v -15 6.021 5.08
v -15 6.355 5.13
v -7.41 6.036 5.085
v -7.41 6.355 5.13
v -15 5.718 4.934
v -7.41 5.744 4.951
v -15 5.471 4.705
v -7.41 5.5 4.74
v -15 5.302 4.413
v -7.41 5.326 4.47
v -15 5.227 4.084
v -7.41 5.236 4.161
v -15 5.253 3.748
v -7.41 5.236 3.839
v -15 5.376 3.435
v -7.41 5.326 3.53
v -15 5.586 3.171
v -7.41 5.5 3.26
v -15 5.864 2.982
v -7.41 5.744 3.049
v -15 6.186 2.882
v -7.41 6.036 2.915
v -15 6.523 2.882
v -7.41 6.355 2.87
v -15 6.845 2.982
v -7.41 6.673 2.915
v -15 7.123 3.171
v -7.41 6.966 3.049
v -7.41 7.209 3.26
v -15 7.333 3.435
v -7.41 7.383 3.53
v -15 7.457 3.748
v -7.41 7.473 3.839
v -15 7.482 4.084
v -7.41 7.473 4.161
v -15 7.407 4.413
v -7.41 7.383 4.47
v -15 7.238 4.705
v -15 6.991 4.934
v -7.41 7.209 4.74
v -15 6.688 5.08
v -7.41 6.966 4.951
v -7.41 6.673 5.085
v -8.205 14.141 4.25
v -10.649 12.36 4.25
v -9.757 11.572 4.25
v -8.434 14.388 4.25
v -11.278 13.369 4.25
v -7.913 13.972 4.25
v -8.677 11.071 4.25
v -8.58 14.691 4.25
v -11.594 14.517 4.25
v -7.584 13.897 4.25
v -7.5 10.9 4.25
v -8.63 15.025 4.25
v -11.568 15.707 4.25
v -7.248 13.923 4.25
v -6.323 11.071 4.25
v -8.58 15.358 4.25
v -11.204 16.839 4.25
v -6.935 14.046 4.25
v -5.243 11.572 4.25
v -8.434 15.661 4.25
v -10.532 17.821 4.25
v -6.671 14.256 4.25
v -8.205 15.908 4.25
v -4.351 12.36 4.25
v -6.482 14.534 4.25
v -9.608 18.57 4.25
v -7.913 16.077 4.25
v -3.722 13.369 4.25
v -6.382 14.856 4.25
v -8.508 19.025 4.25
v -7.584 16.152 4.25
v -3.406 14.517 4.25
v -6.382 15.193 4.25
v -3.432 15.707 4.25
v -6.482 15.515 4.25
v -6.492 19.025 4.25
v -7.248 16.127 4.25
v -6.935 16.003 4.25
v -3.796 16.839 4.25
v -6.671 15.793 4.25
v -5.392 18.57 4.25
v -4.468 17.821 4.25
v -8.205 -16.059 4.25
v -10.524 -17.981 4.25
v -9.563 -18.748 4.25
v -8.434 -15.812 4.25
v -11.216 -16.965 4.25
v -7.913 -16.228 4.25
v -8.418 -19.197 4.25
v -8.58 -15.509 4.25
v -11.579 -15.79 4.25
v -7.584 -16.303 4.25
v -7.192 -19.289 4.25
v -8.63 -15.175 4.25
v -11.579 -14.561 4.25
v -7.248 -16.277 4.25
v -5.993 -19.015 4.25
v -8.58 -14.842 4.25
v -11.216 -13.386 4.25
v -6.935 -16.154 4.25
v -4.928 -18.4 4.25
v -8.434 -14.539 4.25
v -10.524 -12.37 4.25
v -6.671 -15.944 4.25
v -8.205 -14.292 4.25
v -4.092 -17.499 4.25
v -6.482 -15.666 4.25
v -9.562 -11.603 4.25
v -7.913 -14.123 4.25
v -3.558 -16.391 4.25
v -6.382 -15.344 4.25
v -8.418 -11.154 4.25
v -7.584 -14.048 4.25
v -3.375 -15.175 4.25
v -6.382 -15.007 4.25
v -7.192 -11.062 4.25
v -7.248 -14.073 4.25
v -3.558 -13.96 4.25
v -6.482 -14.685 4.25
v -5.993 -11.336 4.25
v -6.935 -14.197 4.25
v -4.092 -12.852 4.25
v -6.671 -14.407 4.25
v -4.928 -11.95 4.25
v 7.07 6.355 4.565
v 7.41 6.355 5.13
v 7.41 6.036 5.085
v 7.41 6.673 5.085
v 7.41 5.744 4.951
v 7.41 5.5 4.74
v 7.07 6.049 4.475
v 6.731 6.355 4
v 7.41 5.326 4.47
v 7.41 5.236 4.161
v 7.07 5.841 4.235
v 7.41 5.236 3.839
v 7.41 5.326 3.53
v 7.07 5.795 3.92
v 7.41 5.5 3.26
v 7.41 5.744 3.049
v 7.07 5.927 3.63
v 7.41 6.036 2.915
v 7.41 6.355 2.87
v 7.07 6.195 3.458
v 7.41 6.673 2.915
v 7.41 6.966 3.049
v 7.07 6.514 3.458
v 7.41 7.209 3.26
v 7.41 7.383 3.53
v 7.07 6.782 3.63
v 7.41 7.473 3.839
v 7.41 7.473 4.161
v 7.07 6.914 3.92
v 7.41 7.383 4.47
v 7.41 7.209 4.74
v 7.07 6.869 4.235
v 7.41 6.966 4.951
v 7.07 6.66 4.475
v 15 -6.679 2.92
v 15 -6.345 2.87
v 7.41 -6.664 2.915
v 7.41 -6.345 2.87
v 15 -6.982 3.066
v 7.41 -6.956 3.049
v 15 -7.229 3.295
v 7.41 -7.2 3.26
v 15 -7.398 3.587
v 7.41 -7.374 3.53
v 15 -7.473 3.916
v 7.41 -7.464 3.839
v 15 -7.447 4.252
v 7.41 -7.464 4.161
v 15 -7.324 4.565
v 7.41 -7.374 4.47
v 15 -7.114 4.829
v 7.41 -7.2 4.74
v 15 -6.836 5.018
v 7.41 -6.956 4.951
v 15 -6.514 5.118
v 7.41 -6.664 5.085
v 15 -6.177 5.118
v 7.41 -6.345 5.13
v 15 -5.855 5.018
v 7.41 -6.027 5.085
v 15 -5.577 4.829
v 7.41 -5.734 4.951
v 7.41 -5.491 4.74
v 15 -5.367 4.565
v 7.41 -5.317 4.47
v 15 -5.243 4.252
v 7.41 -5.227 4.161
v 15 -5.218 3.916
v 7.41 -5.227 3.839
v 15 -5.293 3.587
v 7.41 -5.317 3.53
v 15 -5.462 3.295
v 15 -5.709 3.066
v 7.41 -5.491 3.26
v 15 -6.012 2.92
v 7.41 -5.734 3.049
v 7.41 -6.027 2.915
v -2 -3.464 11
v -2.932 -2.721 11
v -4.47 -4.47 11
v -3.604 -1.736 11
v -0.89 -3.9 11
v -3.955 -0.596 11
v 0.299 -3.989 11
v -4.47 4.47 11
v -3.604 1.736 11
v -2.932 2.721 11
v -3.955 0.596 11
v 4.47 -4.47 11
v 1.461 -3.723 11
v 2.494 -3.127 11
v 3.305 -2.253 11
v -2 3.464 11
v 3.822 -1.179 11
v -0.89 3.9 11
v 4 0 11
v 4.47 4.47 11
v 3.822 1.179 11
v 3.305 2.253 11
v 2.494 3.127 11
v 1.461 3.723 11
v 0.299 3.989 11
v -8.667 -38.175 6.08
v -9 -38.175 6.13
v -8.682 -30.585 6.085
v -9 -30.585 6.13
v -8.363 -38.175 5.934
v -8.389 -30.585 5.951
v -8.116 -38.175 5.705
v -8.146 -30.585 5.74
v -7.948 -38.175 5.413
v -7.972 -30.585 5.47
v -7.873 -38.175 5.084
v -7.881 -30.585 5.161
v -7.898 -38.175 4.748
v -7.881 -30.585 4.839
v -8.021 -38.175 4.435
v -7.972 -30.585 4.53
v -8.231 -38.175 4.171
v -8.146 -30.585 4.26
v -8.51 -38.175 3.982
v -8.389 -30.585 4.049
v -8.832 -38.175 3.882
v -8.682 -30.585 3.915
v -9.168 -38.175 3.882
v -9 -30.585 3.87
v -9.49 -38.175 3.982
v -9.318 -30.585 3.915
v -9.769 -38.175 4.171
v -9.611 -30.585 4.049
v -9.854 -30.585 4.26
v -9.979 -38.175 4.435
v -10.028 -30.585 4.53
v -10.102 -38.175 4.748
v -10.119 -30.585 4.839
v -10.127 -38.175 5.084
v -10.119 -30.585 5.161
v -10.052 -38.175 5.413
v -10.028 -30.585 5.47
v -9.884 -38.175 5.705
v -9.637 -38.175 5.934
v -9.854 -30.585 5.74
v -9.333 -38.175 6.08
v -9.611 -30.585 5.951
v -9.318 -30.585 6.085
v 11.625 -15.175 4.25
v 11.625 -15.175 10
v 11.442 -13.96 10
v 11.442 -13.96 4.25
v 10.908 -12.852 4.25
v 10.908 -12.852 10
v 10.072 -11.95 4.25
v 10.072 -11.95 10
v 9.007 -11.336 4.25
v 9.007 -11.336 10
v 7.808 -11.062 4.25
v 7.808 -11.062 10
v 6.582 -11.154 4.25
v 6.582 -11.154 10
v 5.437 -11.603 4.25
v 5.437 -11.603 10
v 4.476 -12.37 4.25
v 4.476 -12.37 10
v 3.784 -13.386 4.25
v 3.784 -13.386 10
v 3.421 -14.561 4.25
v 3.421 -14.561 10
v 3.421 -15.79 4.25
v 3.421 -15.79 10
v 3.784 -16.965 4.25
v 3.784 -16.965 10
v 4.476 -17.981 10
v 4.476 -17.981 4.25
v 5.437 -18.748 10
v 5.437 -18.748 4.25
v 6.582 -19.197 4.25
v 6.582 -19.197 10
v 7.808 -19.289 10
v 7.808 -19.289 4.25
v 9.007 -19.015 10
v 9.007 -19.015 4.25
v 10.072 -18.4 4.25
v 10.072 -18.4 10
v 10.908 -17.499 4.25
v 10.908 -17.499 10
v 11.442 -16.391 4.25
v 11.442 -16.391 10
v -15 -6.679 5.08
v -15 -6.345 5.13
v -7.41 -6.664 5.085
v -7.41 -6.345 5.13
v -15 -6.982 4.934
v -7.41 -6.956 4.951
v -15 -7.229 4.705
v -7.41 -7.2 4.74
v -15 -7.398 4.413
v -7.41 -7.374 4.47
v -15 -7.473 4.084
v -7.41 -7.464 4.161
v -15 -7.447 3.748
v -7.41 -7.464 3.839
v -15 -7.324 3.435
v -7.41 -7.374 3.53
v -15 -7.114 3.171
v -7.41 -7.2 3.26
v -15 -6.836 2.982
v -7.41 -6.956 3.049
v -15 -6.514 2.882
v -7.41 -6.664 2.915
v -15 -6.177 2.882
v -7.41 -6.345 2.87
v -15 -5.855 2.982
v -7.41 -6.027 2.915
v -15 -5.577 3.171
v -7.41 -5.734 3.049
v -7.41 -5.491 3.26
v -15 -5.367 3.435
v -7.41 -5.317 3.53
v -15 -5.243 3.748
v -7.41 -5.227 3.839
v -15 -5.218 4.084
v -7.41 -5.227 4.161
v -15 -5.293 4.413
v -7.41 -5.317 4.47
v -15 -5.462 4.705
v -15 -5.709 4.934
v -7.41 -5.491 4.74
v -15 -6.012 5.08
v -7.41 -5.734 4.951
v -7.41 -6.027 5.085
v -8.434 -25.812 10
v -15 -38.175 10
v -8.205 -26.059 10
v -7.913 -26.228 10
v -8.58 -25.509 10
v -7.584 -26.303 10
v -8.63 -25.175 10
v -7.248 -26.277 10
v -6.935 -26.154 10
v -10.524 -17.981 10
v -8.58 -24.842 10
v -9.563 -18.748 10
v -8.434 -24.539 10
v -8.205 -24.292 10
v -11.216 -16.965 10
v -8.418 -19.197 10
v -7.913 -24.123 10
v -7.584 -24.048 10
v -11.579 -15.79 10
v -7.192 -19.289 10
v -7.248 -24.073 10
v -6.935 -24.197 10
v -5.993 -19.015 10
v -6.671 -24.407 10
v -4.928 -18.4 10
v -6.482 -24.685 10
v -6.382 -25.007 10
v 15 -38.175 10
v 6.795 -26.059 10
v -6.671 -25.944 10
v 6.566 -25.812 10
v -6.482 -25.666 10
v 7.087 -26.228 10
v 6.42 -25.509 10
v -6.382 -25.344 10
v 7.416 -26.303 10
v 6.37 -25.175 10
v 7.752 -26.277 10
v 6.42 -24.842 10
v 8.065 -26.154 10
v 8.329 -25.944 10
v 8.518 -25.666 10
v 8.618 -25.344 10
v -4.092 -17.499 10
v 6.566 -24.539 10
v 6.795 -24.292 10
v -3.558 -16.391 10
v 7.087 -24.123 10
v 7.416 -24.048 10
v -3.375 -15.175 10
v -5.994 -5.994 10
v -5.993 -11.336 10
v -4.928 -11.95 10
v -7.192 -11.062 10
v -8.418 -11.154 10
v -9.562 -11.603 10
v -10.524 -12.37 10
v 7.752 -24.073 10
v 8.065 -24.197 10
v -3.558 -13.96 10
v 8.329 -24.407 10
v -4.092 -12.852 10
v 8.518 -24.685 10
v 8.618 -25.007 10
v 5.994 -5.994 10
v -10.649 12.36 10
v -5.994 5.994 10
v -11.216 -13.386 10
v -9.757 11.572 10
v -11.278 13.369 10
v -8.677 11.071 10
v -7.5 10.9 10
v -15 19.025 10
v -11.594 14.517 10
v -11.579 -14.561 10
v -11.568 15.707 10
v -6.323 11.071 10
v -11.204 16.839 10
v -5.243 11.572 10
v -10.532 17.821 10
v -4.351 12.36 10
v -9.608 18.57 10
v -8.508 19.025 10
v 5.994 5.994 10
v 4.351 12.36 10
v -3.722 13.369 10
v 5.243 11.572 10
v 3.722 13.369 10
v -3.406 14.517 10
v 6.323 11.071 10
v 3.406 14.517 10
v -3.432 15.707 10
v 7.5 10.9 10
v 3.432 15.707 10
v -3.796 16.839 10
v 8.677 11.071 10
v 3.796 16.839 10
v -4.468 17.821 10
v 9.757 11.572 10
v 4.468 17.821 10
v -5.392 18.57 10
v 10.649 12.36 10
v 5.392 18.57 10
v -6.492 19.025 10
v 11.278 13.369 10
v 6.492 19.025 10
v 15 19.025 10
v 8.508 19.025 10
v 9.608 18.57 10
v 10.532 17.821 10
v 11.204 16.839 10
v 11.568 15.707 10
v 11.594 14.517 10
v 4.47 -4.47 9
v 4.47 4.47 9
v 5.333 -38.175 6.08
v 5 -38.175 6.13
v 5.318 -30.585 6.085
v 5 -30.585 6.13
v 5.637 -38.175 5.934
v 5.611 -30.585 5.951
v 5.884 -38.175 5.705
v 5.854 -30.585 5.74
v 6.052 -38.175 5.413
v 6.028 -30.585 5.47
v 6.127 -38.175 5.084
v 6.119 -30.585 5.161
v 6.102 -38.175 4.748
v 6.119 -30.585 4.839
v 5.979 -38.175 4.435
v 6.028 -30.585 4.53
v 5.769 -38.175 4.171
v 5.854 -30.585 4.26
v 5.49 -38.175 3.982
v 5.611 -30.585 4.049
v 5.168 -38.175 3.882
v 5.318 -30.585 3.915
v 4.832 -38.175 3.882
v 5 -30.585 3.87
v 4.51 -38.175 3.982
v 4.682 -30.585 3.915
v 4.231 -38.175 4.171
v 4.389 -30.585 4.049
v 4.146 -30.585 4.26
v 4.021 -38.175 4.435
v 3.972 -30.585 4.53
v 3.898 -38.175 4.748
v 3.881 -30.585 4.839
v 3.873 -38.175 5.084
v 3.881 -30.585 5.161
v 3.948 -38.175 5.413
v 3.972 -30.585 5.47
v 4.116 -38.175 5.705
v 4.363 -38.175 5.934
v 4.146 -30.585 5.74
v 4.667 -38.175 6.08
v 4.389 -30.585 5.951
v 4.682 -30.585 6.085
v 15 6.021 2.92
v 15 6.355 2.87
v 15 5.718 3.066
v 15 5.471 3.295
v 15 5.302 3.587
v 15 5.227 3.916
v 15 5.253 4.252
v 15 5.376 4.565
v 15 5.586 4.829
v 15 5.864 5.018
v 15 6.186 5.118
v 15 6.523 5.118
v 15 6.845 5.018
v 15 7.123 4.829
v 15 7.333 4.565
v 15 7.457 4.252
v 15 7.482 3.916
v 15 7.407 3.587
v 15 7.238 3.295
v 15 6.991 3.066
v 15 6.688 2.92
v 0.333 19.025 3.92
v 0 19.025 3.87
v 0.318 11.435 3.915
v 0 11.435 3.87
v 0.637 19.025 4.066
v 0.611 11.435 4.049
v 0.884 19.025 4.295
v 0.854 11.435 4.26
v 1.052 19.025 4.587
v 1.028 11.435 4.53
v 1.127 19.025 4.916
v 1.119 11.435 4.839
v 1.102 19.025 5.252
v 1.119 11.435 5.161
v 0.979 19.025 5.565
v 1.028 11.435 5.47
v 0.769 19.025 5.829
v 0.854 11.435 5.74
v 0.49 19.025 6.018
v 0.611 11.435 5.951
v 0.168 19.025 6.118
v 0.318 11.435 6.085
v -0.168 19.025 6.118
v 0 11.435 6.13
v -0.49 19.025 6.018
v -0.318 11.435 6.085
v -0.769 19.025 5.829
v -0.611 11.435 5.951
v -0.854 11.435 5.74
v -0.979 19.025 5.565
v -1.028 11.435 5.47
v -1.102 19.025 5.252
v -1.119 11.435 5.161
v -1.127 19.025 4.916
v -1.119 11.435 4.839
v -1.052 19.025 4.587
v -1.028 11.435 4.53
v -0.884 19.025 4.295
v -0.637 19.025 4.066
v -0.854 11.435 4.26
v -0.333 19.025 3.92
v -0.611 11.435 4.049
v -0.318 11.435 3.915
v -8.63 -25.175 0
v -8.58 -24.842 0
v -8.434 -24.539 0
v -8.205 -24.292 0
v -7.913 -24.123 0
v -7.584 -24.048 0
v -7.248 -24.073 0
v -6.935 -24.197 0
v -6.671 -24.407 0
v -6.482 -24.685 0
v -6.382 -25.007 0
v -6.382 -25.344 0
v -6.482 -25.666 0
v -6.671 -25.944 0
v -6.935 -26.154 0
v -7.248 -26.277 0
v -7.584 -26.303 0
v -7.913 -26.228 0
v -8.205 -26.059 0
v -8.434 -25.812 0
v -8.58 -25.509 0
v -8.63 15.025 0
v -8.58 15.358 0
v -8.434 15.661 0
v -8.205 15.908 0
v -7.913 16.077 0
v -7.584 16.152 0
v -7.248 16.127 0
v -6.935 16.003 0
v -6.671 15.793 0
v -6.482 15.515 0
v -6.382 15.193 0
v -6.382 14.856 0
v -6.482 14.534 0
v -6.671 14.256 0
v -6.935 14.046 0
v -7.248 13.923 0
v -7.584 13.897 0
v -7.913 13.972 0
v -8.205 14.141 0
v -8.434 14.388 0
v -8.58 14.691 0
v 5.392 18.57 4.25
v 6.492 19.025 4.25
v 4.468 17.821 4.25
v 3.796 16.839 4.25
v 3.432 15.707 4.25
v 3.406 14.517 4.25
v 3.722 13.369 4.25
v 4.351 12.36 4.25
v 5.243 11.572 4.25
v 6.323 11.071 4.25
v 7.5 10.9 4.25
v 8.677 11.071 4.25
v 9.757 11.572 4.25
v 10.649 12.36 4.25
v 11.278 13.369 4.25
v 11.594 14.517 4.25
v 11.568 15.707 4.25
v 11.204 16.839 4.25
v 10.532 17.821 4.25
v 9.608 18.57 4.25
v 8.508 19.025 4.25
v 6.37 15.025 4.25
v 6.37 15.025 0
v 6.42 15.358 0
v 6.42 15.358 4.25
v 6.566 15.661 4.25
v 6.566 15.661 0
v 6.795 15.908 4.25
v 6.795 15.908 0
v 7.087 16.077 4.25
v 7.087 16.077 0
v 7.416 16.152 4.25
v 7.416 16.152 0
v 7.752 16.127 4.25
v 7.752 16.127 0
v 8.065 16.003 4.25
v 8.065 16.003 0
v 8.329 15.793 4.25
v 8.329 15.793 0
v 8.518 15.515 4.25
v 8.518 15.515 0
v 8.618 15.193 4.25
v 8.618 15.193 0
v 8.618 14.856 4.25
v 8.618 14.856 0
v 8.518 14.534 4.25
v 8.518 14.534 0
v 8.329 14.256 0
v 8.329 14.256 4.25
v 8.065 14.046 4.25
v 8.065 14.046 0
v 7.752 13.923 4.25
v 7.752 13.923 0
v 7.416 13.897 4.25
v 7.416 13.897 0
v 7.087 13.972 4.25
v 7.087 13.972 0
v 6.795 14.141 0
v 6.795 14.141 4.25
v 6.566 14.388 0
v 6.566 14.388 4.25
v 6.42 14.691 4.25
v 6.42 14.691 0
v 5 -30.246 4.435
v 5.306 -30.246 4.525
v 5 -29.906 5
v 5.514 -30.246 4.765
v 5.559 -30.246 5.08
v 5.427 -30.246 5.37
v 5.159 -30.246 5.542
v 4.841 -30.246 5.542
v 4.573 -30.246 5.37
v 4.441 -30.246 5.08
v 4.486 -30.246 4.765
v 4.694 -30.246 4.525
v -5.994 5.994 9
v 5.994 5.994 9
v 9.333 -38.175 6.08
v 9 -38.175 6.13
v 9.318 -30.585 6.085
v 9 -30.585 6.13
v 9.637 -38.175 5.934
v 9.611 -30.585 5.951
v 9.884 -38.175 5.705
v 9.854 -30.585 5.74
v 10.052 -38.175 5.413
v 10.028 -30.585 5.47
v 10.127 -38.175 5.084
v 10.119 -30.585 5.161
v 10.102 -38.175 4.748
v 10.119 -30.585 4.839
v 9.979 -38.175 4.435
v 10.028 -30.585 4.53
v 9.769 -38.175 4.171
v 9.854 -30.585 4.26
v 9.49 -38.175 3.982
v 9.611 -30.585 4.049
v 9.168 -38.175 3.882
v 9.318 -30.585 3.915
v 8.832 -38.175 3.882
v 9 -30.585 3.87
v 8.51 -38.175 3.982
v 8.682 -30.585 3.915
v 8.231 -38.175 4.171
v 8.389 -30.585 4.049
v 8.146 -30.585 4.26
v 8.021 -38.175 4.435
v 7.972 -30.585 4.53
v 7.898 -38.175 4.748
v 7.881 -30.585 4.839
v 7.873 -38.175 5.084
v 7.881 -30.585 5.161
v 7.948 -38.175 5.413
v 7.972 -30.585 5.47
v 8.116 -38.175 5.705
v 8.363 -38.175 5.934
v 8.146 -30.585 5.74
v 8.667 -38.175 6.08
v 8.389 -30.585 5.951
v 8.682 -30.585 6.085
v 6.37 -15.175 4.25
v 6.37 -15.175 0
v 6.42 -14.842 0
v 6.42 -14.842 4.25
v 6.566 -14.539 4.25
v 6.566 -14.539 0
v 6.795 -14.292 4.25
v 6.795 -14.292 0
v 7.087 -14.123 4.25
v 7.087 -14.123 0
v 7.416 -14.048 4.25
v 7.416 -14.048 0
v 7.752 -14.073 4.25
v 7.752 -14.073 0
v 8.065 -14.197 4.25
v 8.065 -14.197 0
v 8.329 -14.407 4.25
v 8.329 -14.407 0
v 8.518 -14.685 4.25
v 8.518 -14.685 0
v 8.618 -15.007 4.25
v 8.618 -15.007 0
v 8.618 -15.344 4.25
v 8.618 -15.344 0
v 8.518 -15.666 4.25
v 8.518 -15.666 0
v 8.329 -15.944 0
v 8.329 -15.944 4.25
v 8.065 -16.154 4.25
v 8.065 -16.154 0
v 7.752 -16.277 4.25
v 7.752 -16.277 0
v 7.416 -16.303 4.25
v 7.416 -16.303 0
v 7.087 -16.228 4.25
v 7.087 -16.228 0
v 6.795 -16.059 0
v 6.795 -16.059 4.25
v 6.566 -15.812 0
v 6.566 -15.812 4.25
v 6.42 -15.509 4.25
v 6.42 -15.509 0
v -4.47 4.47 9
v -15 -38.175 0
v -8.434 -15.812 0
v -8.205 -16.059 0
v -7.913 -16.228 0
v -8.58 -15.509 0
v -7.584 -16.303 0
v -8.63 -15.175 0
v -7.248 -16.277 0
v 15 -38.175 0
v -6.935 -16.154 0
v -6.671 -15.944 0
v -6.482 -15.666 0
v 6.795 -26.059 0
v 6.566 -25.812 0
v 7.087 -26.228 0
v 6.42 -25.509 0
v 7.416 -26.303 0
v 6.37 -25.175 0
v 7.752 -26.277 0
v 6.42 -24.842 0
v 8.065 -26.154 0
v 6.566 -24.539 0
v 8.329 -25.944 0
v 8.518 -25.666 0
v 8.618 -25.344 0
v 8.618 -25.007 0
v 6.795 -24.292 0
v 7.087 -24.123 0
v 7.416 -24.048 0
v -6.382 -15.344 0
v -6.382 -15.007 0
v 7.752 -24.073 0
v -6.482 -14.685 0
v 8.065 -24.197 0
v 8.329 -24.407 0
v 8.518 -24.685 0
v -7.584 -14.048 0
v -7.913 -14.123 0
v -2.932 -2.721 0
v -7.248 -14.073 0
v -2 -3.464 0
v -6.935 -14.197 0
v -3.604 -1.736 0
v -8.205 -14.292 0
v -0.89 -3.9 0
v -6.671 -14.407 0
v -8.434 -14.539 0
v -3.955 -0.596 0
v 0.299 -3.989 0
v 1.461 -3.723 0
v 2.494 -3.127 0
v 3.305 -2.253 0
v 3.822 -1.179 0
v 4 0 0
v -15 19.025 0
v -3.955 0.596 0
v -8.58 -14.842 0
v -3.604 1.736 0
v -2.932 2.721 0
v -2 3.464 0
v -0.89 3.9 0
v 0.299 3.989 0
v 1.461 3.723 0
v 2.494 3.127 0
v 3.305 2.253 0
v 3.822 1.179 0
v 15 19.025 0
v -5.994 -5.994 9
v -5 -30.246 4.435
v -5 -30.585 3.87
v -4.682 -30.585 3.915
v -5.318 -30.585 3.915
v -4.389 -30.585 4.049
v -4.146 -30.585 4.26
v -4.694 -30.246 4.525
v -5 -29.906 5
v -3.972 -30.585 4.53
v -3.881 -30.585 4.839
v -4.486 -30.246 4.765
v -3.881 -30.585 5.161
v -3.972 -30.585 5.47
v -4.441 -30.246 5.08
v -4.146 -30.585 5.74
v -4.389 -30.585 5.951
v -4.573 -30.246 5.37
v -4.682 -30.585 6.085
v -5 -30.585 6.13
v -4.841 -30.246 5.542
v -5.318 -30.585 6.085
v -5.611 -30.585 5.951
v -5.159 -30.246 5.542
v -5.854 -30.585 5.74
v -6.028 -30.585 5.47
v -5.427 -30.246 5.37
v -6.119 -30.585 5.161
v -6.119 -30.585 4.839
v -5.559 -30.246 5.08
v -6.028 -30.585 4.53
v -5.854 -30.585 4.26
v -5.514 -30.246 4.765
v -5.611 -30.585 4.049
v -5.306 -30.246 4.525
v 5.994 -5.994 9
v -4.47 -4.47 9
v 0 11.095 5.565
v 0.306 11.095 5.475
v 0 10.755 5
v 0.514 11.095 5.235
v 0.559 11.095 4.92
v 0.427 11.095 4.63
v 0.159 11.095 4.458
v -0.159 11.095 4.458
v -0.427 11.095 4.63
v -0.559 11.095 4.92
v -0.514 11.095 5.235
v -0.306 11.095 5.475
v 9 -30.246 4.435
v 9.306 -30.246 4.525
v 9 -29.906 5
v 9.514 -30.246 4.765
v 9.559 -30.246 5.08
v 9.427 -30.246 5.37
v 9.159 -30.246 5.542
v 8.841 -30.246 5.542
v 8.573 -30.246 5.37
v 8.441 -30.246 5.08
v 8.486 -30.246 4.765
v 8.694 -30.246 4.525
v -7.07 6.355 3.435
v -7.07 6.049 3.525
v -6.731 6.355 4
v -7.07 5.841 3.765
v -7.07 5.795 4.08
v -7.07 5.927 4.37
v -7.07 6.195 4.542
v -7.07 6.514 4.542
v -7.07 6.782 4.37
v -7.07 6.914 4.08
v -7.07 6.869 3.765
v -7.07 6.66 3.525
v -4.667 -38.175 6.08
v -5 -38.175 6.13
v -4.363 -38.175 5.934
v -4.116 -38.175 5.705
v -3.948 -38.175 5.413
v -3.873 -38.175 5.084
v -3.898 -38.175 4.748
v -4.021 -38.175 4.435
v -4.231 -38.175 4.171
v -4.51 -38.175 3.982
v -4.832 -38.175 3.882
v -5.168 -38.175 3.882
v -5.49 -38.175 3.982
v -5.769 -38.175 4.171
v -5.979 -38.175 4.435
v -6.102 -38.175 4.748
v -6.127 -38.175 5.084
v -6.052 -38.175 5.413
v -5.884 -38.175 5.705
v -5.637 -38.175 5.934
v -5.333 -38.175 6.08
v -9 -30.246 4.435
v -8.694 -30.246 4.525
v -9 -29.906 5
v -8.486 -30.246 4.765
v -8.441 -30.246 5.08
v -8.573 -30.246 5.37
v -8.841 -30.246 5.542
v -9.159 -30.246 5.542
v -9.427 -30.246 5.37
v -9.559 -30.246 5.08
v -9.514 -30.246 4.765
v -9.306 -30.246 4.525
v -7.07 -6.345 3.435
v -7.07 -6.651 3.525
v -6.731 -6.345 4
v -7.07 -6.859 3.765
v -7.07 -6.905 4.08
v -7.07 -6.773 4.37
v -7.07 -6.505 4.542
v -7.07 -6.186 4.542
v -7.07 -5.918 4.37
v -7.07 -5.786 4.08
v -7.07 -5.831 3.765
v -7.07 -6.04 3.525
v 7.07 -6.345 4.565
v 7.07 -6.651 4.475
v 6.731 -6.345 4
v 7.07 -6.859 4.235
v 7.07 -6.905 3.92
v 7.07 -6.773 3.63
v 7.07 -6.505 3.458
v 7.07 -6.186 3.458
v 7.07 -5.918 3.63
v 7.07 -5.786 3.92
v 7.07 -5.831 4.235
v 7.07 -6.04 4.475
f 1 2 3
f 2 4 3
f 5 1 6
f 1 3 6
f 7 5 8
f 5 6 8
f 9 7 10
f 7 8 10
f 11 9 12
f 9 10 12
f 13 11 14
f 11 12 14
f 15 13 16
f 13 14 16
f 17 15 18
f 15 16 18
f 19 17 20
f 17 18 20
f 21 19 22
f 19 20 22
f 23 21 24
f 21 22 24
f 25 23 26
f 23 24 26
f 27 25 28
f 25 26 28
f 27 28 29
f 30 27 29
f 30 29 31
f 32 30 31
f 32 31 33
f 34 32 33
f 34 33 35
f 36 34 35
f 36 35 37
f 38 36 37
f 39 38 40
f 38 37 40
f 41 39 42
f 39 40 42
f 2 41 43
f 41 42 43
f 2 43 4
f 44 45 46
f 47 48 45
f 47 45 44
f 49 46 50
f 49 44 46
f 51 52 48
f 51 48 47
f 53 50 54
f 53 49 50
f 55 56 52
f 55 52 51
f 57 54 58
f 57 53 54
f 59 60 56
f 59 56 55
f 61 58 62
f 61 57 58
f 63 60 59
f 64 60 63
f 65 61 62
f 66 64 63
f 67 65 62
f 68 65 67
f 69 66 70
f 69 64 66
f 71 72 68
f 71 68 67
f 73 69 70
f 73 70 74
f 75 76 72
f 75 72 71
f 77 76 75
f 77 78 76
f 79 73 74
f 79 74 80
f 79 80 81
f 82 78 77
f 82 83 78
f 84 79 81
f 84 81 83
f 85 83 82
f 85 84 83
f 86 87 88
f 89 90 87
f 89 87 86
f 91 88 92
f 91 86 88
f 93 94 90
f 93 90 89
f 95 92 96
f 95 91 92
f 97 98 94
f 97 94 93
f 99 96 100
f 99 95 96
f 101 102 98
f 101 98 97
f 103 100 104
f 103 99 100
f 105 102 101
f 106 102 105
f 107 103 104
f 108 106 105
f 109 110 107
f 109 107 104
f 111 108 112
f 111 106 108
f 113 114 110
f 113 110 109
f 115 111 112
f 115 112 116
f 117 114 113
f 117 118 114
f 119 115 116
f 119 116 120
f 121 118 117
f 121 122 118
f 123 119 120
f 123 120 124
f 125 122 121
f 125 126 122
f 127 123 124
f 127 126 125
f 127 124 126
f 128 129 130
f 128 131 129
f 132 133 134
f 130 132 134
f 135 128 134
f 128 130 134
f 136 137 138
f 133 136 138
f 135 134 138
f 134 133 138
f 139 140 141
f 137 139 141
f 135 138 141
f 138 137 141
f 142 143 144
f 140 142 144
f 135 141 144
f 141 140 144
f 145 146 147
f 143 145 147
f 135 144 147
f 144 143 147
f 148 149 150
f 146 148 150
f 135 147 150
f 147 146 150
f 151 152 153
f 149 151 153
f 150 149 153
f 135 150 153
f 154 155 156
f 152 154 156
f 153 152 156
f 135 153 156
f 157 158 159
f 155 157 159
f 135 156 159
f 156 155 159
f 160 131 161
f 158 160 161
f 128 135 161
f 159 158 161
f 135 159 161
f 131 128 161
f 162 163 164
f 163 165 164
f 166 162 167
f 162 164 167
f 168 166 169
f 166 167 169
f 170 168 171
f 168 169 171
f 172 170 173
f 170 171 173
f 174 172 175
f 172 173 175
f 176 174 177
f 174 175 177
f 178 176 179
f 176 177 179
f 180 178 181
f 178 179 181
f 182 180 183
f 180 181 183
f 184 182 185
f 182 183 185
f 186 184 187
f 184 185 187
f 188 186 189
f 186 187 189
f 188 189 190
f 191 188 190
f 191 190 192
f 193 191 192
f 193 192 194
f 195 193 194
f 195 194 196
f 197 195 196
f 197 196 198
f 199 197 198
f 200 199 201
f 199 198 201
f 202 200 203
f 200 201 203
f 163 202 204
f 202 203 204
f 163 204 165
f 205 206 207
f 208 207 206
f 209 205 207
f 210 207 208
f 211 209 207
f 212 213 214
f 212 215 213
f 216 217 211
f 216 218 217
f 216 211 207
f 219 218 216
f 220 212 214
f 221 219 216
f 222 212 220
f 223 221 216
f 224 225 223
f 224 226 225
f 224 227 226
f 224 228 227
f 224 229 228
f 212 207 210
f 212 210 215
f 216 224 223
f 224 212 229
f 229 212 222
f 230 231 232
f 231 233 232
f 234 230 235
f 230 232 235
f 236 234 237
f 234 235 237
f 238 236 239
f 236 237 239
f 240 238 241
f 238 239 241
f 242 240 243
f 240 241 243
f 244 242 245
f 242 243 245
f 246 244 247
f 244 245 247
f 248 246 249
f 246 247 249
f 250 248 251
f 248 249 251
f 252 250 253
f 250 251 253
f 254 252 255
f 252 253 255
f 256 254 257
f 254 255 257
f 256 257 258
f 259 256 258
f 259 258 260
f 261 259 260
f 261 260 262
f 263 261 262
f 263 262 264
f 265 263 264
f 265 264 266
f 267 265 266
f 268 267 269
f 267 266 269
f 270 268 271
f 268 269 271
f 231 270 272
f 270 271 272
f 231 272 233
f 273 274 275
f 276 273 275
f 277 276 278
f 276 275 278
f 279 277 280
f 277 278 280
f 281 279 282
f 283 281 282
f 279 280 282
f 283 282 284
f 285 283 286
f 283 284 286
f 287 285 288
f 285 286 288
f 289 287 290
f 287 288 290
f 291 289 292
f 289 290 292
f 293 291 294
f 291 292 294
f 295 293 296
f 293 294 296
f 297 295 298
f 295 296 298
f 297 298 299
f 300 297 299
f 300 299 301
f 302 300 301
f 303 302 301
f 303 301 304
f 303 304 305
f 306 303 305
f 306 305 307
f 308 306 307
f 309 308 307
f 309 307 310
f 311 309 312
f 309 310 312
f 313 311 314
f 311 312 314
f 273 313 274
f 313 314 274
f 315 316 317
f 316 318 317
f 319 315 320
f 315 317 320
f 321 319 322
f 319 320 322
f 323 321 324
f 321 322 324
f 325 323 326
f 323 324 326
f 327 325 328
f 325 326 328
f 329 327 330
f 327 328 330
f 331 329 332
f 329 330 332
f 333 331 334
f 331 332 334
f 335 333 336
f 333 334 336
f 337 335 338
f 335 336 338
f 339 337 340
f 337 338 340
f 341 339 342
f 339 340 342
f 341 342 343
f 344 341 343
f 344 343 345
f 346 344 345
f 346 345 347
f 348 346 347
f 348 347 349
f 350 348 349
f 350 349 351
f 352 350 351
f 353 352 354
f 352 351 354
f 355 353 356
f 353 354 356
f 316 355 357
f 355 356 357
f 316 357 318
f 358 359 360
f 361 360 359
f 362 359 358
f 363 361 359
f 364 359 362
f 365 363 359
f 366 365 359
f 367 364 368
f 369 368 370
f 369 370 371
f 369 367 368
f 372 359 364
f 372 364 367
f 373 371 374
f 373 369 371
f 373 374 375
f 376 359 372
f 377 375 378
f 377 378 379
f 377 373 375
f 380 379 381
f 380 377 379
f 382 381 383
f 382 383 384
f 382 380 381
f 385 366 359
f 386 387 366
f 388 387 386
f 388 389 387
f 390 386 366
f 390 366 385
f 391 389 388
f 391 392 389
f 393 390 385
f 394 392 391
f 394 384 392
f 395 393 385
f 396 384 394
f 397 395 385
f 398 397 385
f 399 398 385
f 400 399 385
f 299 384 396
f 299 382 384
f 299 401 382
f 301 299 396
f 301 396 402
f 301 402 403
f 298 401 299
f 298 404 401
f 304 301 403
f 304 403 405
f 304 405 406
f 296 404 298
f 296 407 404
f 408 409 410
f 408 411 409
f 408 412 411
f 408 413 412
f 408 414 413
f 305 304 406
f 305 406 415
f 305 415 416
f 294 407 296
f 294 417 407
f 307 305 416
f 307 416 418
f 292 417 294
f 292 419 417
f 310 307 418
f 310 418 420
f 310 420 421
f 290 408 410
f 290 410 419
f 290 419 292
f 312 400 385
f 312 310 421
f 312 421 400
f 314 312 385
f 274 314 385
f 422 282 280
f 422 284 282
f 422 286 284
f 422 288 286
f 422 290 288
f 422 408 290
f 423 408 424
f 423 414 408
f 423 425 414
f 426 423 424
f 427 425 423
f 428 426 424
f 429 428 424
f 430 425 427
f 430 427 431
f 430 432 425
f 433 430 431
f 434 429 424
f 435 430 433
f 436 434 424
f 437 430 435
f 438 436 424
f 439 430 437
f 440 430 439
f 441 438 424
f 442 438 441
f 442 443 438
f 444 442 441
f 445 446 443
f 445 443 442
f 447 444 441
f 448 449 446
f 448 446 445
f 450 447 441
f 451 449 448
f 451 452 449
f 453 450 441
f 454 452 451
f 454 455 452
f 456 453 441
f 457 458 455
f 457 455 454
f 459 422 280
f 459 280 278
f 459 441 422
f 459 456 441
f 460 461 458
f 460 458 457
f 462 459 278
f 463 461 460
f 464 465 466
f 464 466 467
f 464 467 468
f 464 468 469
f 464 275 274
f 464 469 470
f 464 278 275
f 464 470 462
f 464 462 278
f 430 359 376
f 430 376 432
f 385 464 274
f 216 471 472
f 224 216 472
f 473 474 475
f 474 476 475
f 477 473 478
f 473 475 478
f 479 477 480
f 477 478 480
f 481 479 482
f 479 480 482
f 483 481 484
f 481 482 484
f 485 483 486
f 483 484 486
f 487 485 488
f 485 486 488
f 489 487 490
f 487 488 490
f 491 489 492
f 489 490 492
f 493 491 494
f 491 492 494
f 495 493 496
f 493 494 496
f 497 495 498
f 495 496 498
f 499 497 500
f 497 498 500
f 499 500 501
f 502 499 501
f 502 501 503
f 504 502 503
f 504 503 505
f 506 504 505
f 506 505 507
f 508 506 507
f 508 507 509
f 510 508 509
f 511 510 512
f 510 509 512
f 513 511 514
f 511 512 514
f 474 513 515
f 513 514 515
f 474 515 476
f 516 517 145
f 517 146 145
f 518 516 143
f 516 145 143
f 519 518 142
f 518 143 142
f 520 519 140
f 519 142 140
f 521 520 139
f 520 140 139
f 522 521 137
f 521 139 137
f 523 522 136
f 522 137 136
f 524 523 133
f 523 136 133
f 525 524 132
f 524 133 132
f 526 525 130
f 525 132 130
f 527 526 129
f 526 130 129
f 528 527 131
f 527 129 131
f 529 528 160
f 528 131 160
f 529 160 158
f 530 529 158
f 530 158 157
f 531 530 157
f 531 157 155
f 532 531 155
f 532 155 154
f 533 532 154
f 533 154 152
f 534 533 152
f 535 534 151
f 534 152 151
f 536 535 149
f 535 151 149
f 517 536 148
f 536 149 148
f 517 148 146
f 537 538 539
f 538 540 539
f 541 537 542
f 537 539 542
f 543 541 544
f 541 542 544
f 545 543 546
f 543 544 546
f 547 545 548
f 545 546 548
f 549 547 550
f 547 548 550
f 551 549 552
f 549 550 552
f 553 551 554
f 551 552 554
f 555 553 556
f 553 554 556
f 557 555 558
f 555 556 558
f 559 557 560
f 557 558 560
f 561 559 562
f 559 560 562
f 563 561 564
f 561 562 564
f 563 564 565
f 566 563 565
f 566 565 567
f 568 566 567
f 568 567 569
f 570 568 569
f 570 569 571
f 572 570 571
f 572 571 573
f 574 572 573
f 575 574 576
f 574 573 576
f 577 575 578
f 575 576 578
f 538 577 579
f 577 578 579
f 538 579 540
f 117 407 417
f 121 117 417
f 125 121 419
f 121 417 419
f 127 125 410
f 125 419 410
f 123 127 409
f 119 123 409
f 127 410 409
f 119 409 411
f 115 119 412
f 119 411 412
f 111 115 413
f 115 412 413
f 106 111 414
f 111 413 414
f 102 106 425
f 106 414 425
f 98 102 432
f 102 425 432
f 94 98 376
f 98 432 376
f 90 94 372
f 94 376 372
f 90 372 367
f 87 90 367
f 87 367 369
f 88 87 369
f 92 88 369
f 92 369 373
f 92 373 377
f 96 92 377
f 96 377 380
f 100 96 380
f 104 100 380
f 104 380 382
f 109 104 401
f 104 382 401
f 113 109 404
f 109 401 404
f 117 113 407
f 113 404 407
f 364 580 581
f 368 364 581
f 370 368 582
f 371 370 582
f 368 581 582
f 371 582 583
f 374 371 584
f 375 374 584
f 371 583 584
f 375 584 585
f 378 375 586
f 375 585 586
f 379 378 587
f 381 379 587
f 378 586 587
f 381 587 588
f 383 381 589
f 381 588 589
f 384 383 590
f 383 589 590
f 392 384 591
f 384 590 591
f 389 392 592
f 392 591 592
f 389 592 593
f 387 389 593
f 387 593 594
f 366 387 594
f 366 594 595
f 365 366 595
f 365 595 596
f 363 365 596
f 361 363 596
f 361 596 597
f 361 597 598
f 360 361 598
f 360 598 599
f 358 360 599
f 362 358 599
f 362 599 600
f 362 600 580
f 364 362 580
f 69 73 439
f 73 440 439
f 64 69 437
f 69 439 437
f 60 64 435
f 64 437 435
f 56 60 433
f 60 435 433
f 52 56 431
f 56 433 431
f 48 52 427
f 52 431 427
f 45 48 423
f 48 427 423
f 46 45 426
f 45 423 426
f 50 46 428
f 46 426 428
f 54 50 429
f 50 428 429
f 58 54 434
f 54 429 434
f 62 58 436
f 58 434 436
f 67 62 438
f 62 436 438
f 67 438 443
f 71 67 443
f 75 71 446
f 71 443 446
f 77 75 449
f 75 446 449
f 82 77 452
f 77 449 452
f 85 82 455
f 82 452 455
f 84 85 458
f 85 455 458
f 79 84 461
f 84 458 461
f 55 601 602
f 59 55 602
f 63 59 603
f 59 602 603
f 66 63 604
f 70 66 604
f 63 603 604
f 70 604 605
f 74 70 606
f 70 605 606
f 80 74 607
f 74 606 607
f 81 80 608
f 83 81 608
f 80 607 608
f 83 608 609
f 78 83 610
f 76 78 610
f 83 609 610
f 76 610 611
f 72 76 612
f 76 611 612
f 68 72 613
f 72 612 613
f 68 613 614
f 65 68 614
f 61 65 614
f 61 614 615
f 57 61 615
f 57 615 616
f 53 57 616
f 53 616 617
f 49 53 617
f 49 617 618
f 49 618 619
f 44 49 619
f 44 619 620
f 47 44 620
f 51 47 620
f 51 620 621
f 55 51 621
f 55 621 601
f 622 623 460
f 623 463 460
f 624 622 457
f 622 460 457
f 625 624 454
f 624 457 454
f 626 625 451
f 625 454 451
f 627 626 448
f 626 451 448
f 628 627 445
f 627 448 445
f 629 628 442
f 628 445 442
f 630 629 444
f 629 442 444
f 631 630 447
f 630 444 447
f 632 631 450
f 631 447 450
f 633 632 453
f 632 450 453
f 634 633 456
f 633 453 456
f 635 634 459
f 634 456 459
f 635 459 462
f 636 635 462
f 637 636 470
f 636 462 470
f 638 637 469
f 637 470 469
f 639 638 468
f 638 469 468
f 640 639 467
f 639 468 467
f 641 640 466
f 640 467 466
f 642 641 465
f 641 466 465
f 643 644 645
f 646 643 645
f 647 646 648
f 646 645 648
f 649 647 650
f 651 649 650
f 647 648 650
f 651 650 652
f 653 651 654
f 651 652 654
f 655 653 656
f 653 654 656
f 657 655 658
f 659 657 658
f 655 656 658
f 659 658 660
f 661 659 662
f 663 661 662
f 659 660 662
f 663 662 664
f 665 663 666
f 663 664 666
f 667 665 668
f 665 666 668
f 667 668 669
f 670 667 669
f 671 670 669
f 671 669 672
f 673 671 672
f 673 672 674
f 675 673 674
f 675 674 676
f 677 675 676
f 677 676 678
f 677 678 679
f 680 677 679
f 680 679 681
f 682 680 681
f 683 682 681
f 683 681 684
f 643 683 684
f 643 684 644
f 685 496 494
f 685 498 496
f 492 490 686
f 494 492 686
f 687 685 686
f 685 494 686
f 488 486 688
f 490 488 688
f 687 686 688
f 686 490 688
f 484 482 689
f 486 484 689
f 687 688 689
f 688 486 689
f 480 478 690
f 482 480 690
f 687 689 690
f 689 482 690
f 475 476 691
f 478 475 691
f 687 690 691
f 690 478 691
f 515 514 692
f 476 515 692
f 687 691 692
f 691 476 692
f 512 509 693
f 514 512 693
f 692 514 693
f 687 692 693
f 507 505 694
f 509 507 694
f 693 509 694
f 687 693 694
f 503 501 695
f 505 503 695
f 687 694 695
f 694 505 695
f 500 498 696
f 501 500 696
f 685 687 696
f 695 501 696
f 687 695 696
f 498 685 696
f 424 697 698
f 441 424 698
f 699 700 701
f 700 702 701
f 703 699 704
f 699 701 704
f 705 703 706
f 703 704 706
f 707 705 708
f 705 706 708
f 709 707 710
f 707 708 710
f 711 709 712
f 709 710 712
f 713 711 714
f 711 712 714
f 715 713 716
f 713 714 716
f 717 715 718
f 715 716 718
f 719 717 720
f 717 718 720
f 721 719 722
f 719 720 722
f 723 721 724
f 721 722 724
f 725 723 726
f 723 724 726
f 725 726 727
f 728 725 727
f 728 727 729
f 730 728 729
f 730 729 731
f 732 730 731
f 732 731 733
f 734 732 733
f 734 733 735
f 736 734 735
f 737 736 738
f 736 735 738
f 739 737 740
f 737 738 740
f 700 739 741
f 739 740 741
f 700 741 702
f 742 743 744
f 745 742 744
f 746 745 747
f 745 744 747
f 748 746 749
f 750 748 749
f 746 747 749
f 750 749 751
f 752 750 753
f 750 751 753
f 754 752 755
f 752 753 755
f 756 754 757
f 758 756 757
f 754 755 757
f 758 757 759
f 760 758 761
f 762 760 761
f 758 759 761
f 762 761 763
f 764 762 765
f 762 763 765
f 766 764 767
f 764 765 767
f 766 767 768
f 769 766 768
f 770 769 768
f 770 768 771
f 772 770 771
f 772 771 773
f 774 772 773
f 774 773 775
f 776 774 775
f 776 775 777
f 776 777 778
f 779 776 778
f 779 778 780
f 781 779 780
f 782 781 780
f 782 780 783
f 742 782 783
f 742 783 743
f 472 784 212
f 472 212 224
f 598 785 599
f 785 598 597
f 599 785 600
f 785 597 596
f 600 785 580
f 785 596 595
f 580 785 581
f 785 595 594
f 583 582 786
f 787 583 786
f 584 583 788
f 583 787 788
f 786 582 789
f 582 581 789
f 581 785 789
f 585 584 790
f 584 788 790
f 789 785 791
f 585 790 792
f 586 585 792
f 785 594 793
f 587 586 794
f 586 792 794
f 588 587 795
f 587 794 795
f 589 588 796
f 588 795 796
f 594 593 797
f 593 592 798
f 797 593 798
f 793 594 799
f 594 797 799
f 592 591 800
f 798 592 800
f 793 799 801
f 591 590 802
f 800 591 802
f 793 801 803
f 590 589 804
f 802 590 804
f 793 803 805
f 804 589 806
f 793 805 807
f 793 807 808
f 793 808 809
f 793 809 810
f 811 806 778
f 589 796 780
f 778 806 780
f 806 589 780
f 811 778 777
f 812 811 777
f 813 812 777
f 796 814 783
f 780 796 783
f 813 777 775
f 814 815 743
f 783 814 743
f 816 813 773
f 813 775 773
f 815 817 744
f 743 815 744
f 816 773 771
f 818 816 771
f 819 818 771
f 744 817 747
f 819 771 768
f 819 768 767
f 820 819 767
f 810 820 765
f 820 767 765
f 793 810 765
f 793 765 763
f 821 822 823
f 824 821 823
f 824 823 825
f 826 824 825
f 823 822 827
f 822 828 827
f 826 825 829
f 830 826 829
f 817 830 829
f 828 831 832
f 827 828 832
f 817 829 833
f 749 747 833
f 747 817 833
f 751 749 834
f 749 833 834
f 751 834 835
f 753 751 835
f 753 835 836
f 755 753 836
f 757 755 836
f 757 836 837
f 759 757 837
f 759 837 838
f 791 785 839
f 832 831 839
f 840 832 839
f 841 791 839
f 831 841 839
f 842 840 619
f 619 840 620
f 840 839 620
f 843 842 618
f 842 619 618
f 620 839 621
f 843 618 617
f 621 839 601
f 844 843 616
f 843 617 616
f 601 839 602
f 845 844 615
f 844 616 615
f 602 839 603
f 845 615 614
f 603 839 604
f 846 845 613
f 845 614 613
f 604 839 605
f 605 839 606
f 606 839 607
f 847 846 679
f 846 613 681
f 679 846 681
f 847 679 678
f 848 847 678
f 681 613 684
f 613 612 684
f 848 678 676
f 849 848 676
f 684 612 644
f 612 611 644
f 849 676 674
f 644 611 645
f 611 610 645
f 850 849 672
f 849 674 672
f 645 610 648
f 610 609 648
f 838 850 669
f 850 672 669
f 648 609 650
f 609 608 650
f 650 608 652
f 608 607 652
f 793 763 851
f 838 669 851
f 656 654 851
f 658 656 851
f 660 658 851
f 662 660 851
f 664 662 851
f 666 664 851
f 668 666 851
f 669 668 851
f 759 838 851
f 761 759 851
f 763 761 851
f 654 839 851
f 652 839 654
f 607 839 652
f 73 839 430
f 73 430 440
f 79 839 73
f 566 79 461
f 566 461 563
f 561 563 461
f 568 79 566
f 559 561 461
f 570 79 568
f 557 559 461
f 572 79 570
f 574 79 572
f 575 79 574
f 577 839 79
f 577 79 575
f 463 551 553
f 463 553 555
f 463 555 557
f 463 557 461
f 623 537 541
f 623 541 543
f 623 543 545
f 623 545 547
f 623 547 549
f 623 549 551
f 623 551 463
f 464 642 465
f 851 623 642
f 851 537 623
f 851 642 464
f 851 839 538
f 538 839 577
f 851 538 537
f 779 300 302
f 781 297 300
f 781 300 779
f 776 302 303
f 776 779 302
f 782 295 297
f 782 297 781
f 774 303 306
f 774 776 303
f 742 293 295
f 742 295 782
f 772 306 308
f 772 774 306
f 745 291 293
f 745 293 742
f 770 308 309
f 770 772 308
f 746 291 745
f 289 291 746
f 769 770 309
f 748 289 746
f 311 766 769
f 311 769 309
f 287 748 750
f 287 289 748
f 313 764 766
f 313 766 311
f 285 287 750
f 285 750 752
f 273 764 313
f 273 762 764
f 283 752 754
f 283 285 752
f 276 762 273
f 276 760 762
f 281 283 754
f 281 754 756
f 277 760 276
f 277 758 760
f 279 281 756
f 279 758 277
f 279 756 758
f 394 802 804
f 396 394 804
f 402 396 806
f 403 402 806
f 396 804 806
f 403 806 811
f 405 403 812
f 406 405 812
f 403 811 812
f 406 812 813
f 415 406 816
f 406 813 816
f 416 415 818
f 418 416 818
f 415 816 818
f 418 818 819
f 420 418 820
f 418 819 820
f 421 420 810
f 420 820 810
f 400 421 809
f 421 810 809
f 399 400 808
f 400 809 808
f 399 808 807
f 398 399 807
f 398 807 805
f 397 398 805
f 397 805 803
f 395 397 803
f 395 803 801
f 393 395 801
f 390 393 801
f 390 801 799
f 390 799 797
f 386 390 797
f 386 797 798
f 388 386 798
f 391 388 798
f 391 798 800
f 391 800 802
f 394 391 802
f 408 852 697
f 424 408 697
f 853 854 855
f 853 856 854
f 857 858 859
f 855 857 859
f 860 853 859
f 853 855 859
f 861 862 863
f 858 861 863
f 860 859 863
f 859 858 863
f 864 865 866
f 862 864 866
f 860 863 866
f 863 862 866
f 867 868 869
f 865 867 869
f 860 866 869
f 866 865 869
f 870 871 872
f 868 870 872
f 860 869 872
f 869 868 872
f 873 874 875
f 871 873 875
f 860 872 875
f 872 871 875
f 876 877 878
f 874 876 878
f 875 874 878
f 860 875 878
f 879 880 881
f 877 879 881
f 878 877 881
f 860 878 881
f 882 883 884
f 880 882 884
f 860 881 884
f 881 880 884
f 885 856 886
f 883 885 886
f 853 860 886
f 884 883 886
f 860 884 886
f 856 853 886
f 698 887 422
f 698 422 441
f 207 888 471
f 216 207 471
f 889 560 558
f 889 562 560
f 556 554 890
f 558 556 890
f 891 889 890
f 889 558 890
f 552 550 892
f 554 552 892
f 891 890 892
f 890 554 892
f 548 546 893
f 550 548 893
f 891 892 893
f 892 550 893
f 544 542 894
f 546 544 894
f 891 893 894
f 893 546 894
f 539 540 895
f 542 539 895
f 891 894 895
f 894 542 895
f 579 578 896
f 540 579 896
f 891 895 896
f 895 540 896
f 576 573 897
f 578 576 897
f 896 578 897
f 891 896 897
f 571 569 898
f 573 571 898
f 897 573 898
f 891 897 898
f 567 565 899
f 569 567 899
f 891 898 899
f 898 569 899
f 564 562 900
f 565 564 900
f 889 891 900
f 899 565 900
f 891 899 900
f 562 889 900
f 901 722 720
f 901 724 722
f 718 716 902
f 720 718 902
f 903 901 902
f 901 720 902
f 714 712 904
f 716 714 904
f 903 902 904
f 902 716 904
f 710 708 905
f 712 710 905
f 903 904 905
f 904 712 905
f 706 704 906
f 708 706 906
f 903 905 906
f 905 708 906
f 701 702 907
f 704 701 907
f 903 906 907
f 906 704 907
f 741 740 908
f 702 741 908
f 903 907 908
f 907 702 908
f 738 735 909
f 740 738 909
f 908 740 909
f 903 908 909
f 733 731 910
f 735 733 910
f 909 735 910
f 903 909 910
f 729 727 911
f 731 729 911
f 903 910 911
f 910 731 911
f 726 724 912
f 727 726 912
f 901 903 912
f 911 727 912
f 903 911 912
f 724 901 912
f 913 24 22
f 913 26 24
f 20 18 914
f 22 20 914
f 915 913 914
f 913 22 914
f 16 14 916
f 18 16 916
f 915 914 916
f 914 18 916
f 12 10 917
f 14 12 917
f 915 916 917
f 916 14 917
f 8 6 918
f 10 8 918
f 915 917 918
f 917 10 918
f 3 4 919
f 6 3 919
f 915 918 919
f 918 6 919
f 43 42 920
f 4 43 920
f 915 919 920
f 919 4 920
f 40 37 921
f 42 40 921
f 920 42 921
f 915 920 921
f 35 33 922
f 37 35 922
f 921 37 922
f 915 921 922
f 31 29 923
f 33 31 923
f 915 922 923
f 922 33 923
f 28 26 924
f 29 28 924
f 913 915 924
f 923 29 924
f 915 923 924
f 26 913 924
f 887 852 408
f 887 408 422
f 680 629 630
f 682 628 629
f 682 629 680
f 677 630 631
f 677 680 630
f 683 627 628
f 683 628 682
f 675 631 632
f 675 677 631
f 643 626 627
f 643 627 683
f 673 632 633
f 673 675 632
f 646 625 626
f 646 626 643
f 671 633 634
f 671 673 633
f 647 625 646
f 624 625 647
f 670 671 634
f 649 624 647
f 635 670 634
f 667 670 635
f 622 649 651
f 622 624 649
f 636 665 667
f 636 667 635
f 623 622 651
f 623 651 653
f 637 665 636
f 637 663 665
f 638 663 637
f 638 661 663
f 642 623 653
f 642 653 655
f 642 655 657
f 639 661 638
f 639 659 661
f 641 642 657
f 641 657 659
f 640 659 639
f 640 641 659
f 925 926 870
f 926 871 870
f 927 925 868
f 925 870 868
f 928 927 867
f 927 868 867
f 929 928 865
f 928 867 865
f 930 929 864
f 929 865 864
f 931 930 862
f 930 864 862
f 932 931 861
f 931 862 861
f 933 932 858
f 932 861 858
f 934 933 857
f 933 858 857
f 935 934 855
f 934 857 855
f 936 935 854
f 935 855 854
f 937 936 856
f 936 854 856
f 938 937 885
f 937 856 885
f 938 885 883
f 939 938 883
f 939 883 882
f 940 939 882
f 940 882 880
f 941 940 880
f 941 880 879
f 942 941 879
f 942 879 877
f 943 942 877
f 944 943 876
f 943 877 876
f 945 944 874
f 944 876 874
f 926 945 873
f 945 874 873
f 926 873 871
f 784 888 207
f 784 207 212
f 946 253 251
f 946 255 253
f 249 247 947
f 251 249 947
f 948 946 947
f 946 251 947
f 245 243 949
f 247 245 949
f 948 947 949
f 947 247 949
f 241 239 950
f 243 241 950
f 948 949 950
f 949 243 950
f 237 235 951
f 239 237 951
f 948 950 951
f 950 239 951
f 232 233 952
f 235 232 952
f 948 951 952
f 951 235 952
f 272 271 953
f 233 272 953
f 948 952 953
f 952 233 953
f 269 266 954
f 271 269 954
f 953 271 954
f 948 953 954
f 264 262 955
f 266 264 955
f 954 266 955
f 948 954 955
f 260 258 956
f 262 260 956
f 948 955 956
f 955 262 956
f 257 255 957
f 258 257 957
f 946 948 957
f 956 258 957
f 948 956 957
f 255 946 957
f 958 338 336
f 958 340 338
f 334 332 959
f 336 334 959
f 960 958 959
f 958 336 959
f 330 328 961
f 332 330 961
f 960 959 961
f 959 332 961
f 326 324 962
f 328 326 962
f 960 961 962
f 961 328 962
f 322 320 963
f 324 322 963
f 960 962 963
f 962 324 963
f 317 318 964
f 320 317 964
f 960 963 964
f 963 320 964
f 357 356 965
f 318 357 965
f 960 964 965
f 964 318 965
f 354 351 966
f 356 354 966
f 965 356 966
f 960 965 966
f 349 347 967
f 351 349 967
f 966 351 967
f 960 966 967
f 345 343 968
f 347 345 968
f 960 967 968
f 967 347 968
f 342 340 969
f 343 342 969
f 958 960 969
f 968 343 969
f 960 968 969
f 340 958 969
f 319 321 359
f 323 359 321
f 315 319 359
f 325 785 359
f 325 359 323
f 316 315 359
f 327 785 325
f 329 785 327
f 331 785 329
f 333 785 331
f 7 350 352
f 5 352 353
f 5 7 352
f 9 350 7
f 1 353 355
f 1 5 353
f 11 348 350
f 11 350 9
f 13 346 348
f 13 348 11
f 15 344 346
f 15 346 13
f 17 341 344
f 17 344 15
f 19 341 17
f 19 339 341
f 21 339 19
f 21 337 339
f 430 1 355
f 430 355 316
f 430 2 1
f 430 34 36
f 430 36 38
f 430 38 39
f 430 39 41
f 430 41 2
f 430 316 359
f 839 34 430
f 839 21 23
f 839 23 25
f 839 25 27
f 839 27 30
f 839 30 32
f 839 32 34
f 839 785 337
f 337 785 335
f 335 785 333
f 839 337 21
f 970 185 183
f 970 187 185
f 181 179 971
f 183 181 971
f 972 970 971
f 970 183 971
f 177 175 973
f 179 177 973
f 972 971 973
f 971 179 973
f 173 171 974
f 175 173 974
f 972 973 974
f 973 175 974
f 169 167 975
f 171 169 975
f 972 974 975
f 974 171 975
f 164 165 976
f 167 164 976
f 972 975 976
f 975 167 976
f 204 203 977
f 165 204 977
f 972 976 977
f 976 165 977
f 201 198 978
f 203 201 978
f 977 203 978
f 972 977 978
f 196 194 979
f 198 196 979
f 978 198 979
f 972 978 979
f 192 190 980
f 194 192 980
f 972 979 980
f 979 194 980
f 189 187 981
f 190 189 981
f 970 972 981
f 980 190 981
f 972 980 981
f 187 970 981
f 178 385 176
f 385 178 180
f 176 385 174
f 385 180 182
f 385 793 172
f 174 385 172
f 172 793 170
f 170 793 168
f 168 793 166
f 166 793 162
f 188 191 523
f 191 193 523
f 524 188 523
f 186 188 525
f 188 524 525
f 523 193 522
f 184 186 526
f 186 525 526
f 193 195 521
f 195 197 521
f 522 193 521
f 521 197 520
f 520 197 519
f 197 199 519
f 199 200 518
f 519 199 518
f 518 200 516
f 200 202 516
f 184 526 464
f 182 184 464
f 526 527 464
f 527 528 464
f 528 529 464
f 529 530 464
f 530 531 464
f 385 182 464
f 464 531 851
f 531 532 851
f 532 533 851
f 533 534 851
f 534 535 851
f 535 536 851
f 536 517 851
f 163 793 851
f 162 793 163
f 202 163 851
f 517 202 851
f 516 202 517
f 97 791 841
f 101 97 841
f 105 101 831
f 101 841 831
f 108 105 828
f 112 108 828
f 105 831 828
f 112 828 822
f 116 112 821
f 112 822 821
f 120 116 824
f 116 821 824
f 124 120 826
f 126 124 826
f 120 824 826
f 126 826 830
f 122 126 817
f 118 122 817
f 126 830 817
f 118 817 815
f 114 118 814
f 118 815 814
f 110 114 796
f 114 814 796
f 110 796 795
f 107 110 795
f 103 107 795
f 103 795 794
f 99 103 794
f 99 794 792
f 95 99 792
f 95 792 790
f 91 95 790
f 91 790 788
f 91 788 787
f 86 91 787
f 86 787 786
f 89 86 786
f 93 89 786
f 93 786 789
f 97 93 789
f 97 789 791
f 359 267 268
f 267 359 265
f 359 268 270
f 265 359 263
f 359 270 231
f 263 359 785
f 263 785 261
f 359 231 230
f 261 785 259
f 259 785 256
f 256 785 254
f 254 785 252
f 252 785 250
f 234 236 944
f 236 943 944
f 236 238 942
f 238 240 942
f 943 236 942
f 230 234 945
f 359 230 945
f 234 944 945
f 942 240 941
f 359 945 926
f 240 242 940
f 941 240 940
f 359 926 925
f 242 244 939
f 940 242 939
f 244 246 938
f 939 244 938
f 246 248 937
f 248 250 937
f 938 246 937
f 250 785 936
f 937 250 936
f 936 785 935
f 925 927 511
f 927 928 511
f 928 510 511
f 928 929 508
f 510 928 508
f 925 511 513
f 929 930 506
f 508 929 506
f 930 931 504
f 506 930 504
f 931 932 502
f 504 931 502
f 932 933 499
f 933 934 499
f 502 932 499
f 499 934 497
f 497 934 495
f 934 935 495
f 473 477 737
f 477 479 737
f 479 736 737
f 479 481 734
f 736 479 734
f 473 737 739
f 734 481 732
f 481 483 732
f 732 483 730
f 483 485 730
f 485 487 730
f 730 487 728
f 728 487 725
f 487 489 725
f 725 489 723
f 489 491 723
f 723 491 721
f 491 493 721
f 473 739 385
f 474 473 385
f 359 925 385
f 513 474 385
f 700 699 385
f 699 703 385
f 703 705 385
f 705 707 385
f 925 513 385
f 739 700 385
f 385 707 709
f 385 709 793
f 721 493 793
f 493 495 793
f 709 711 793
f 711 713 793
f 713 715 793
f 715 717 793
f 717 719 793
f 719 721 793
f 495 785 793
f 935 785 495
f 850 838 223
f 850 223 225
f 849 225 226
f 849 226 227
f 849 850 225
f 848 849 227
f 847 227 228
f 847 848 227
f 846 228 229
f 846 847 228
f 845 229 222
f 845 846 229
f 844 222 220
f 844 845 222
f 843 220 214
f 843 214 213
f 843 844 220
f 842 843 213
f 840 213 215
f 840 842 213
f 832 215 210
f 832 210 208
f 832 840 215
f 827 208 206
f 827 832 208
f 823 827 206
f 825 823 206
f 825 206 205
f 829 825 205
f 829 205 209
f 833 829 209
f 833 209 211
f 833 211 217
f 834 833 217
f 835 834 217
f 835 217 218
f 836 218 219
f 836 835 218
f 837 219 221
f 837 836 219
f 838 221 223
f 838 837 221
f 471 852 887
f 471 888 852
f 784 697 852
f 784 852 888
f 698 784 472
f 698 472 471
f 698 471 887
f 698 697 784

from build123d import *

# Parameters (mm, degrees)
SKETCH1_W                           = 30
SKETCH1_H                           = 57.2
SKETCH1_W_2                         = 11.9888
SKETCH1_H_2                         = 11.9888
BOSS_EXTRUDE1_DEPTH                 = 10
SKETCH1_7_W                         = 11.9888
SKETCH1_7_H                         = 11.9888
SKETCH1_7_W_2                       = 8.9408
SKETCH1_7_H_2                       = 8.9408
BOSS_EXTRUDE2_DEPTH                 = 9
SKETCH1_8_W                         = 8.9408
SKETCH1_8_H                         = 8.9408
SKETCH1_8_R                         = 4
BOSS_EXTRUDE3_DEPTH                 = 11
F_4_40_TAPPED_HOLE1_D               = 2.2606
CUT_EXTRUDE1_START                  = 10
SKETCH3_R                           = 4.125
CUT_EXTRUDE1_DEPTH                  = 5.75
F_4_40_TAPPED_HOLE2_D               = 2.2606
F_4_40_TAPPED_HOLE2_DEPTH           = 7.59
F_4_40_TAPPED_HOLE2_TIP             = 0.679152758
F_4_40_TAPPED_HOLE2_ON_FACE_2_D     = 2.2606
F_4_40_TAPPED_HOLE2_ON_FACE_2_DEPTH = 7.59
F_4_40_TAPPED_HOLE2_ON_FACE_2_TIP   = 0.679152758
F_4_40_TAPPED_HOLE2_ON_FACE_3_D     = 2.2606
F_4_40_TAPPED_HOLE2_ON_FACE_3_DEPTH = 7.59
F_4_40_TAPPED_HOLE2_ON_FACE_3_TIP   = 0.679152758
F_4_40_TAPPED_HOLE2_ON_FACE_4_D     = 2.2606
F_4_40_TAPPED_HOLE2_ON_FACE_4_DEPTH = 7.59
F_4_40_TAPPED_HOLE2_ON_FACE_4_TIP   = 0.679152758


with BuildPart() as part:
    # Sketch1 → Boss-Extrude1 (new body)
    with BuildSketch(Plane.XY):
        with Locations((0, -9.5754)):
            Rectangle(SKETCH1_W, SKETCH1_H)
        Rectangle(SKETCH1_W_2, SKETCH1_H_2, mode=Mode.SUBTRACT)
    extrude(amount=BOSS_EXTRUDE1_DEPTH)

    # Sketch1<7> → Boss-Extrude2 (add)
    with BuildSketch(Plane.XY):
        Rectangle(SKETCH1_7_W, SKETCH1_7_H)
        Rectangle(SKETCH1_7_W_2, SKETCH1_7_H_2, mode=Mode.SUBTRACT)
    extrude(amount=BOSS_EXTRUDE2_DEPTH)

    # Sketch1<8> → Boss-Extrude3 (add)
    with BuildSketch(Plane.XY):
        Rectangle(SKETCH1_8_W, SKETCH1_8_H)
        Circle(SKETCH1_8_R, mode=Mode.SUBTRACT)
    extrude(amount=BOSS_EXTRUDE3_DEPTH)

    # #4-40 Tapped Hole1 (through all)
    with Locations(Plane(origin=(-7.5, 15.0246, 10), x_dir=(1, 0, 0), z_dir=(0, 0, 1))):
        with Locations((0, 0), (15, 0), (0, -30.2), (0, -40.2), (15, -30.2), (15, -40.2)):
            Hole(F_4_40_TAPPED_HOLE1_D / 2)

    # Sketch3 → Cut-Extrude1 (cut)
    with BuildSketch(Plane.XY.offset(CUT_EXTRUDE1_START)):
        with Locations((7.5, -15.1754)):
            Circle(SKETCH3_R)
        Polygon((4.325, -17.008487105), (4.325, -13.342312895), (7.5, -11.509225791), (10.675, -13.342312895), (10.675, -17.008487105), (7.5, -18.841574209), align=None, mode=Mode.SUBTRACT)
        Polygon((4.325, -13.342312895), (7.5, -11.509225791), (10.675, -13.342312895), (10.675, -17.008487105), (7.5, -18.841574209), (4.325, -17.008487105), align=None)
        with Locations((7.5, 15.0246)):
            Circle(SKETCH3_R)
        with Locations((-7.5, 15.0246)):
            Circle(SKETCH3_R)
        with Locations((-7.5, -15.1754)):
            Circle(SKETCH3_R)
    extrude(amount=-CUT_EXTRUDE1_DEPTH, mode=Mode.SUBTRACT)

    # #4-40 Tapped Hole2
    with Locations(Plane(origin=(9, -38.1754, 5), x_dir=(0, 0, -1), z_dir=(0, -1, 0))):
        with Locations((0, 0), (0, -18), (0, -14), (0, -4)):
            Hole(F_4_40_TAPPED_HOLE2_D / 2, depth=F_4_40_TAPPED_HOLE2_DEPTH)
            with Locations((0, 0, -(F_4_40_TAPPED_HOLE2_DEPTH + F_4_40_TAPPED_HOLE2_TIP / 2))):  # 118° drill point
                Cone(0, F_4_40_TAPPED_HOLE2_D / 2, F_4_40_TAPPED_HOLE2_TIP, mode=Mode.SUBTRACT)

    # #4-40 Tapped Hole2 on face 2
    with Locations(Plane(origin=(0, 19.0246, 5), x_dir=(0, 0, 1), z_dir=(0, 1, 0))):
        with Locations((0, 0)):
            Hole(F_4_40_TAPPED_HOLE2_ON_FACE_2_D / 2, depth=F_4_40_TAPPED_HOLE2_ON_FACE_2_DEPTH)
            with Locations((0, 0, -(F_4_40_TAPPED_HOLE2_ON_FACE_2_DEPTH + F_4_40_TAPPED_HOLE2_ON_FACE_2_TIP / 2))):  # 118° drill point
                Cone(0, F_4_40_TAPPED_HOLE2_ON_FACE_2_D / 2, F_4_40_TAPPED_HOLE2_ON_FACE_2_TIP, mode=Mode.SUBTRACT)

    # #4-40 Tapped Hole2 on face 3
    with Locations(Plane(origin=(15, 6.3546, 4), x_dir=(0, 0, 1), z_dir=(1, 0, 0))):
        with Locations((0, 0), (0, 12.7)):
            Hole(F_4_40_TAPPED_HOLE2_ON_FACE_3_D / 2, depth=F_4_40_TAPPED_HOLE2_ON_FACE_3_DEPTH)
            with Locations((0, 0, -(F_4_40_TAPPED_HOLE2_ON_FACE_3_DEPTH + F_4_40_TAPPED_HOLE2_ON_FACE_3_TIP / 2))):  # 118° drill point
                Cone(0, F_4_40_TAPPED_HOLE2_ON_FACE_3_D / 2, F_4_40_TAPPED_HOLE2_ON_FACE_3_TIP, mode=Mode.SUBTRACT)

    # #4-40 Tapped Hole2 on face 4
    with Locations(Plane(origin=(-15, 6.3546, 4), x_dir=(0, 0, -1), z_dir=(-1, 0, 0))):
        with Locations((0, 0), (0, 12.7)):
            Hole(F_4_40_TAPPED_HOLE2_ON_FACE_4_D / 2, depth=F_4_40_TAPPED_HOLE2_ON_FACE_4_DEPTH)
            with Locations((0, 0, -(F_4_40_TAPPED_HOLE2_ON_FACE_4_DEPTH + F_4_40_TAPPED_HOLE2_ON_FACE_4_TIP / 2))):  # 118° drill point
                Cone(0, F_4_40_TAPPED_HOLE2_ON_FACE_4_D / 2, F_4_40_TAPPED_HOLE2_ON_FACE_4_TIP, mode=Mode.SUBTRACT)


solid = part.part
